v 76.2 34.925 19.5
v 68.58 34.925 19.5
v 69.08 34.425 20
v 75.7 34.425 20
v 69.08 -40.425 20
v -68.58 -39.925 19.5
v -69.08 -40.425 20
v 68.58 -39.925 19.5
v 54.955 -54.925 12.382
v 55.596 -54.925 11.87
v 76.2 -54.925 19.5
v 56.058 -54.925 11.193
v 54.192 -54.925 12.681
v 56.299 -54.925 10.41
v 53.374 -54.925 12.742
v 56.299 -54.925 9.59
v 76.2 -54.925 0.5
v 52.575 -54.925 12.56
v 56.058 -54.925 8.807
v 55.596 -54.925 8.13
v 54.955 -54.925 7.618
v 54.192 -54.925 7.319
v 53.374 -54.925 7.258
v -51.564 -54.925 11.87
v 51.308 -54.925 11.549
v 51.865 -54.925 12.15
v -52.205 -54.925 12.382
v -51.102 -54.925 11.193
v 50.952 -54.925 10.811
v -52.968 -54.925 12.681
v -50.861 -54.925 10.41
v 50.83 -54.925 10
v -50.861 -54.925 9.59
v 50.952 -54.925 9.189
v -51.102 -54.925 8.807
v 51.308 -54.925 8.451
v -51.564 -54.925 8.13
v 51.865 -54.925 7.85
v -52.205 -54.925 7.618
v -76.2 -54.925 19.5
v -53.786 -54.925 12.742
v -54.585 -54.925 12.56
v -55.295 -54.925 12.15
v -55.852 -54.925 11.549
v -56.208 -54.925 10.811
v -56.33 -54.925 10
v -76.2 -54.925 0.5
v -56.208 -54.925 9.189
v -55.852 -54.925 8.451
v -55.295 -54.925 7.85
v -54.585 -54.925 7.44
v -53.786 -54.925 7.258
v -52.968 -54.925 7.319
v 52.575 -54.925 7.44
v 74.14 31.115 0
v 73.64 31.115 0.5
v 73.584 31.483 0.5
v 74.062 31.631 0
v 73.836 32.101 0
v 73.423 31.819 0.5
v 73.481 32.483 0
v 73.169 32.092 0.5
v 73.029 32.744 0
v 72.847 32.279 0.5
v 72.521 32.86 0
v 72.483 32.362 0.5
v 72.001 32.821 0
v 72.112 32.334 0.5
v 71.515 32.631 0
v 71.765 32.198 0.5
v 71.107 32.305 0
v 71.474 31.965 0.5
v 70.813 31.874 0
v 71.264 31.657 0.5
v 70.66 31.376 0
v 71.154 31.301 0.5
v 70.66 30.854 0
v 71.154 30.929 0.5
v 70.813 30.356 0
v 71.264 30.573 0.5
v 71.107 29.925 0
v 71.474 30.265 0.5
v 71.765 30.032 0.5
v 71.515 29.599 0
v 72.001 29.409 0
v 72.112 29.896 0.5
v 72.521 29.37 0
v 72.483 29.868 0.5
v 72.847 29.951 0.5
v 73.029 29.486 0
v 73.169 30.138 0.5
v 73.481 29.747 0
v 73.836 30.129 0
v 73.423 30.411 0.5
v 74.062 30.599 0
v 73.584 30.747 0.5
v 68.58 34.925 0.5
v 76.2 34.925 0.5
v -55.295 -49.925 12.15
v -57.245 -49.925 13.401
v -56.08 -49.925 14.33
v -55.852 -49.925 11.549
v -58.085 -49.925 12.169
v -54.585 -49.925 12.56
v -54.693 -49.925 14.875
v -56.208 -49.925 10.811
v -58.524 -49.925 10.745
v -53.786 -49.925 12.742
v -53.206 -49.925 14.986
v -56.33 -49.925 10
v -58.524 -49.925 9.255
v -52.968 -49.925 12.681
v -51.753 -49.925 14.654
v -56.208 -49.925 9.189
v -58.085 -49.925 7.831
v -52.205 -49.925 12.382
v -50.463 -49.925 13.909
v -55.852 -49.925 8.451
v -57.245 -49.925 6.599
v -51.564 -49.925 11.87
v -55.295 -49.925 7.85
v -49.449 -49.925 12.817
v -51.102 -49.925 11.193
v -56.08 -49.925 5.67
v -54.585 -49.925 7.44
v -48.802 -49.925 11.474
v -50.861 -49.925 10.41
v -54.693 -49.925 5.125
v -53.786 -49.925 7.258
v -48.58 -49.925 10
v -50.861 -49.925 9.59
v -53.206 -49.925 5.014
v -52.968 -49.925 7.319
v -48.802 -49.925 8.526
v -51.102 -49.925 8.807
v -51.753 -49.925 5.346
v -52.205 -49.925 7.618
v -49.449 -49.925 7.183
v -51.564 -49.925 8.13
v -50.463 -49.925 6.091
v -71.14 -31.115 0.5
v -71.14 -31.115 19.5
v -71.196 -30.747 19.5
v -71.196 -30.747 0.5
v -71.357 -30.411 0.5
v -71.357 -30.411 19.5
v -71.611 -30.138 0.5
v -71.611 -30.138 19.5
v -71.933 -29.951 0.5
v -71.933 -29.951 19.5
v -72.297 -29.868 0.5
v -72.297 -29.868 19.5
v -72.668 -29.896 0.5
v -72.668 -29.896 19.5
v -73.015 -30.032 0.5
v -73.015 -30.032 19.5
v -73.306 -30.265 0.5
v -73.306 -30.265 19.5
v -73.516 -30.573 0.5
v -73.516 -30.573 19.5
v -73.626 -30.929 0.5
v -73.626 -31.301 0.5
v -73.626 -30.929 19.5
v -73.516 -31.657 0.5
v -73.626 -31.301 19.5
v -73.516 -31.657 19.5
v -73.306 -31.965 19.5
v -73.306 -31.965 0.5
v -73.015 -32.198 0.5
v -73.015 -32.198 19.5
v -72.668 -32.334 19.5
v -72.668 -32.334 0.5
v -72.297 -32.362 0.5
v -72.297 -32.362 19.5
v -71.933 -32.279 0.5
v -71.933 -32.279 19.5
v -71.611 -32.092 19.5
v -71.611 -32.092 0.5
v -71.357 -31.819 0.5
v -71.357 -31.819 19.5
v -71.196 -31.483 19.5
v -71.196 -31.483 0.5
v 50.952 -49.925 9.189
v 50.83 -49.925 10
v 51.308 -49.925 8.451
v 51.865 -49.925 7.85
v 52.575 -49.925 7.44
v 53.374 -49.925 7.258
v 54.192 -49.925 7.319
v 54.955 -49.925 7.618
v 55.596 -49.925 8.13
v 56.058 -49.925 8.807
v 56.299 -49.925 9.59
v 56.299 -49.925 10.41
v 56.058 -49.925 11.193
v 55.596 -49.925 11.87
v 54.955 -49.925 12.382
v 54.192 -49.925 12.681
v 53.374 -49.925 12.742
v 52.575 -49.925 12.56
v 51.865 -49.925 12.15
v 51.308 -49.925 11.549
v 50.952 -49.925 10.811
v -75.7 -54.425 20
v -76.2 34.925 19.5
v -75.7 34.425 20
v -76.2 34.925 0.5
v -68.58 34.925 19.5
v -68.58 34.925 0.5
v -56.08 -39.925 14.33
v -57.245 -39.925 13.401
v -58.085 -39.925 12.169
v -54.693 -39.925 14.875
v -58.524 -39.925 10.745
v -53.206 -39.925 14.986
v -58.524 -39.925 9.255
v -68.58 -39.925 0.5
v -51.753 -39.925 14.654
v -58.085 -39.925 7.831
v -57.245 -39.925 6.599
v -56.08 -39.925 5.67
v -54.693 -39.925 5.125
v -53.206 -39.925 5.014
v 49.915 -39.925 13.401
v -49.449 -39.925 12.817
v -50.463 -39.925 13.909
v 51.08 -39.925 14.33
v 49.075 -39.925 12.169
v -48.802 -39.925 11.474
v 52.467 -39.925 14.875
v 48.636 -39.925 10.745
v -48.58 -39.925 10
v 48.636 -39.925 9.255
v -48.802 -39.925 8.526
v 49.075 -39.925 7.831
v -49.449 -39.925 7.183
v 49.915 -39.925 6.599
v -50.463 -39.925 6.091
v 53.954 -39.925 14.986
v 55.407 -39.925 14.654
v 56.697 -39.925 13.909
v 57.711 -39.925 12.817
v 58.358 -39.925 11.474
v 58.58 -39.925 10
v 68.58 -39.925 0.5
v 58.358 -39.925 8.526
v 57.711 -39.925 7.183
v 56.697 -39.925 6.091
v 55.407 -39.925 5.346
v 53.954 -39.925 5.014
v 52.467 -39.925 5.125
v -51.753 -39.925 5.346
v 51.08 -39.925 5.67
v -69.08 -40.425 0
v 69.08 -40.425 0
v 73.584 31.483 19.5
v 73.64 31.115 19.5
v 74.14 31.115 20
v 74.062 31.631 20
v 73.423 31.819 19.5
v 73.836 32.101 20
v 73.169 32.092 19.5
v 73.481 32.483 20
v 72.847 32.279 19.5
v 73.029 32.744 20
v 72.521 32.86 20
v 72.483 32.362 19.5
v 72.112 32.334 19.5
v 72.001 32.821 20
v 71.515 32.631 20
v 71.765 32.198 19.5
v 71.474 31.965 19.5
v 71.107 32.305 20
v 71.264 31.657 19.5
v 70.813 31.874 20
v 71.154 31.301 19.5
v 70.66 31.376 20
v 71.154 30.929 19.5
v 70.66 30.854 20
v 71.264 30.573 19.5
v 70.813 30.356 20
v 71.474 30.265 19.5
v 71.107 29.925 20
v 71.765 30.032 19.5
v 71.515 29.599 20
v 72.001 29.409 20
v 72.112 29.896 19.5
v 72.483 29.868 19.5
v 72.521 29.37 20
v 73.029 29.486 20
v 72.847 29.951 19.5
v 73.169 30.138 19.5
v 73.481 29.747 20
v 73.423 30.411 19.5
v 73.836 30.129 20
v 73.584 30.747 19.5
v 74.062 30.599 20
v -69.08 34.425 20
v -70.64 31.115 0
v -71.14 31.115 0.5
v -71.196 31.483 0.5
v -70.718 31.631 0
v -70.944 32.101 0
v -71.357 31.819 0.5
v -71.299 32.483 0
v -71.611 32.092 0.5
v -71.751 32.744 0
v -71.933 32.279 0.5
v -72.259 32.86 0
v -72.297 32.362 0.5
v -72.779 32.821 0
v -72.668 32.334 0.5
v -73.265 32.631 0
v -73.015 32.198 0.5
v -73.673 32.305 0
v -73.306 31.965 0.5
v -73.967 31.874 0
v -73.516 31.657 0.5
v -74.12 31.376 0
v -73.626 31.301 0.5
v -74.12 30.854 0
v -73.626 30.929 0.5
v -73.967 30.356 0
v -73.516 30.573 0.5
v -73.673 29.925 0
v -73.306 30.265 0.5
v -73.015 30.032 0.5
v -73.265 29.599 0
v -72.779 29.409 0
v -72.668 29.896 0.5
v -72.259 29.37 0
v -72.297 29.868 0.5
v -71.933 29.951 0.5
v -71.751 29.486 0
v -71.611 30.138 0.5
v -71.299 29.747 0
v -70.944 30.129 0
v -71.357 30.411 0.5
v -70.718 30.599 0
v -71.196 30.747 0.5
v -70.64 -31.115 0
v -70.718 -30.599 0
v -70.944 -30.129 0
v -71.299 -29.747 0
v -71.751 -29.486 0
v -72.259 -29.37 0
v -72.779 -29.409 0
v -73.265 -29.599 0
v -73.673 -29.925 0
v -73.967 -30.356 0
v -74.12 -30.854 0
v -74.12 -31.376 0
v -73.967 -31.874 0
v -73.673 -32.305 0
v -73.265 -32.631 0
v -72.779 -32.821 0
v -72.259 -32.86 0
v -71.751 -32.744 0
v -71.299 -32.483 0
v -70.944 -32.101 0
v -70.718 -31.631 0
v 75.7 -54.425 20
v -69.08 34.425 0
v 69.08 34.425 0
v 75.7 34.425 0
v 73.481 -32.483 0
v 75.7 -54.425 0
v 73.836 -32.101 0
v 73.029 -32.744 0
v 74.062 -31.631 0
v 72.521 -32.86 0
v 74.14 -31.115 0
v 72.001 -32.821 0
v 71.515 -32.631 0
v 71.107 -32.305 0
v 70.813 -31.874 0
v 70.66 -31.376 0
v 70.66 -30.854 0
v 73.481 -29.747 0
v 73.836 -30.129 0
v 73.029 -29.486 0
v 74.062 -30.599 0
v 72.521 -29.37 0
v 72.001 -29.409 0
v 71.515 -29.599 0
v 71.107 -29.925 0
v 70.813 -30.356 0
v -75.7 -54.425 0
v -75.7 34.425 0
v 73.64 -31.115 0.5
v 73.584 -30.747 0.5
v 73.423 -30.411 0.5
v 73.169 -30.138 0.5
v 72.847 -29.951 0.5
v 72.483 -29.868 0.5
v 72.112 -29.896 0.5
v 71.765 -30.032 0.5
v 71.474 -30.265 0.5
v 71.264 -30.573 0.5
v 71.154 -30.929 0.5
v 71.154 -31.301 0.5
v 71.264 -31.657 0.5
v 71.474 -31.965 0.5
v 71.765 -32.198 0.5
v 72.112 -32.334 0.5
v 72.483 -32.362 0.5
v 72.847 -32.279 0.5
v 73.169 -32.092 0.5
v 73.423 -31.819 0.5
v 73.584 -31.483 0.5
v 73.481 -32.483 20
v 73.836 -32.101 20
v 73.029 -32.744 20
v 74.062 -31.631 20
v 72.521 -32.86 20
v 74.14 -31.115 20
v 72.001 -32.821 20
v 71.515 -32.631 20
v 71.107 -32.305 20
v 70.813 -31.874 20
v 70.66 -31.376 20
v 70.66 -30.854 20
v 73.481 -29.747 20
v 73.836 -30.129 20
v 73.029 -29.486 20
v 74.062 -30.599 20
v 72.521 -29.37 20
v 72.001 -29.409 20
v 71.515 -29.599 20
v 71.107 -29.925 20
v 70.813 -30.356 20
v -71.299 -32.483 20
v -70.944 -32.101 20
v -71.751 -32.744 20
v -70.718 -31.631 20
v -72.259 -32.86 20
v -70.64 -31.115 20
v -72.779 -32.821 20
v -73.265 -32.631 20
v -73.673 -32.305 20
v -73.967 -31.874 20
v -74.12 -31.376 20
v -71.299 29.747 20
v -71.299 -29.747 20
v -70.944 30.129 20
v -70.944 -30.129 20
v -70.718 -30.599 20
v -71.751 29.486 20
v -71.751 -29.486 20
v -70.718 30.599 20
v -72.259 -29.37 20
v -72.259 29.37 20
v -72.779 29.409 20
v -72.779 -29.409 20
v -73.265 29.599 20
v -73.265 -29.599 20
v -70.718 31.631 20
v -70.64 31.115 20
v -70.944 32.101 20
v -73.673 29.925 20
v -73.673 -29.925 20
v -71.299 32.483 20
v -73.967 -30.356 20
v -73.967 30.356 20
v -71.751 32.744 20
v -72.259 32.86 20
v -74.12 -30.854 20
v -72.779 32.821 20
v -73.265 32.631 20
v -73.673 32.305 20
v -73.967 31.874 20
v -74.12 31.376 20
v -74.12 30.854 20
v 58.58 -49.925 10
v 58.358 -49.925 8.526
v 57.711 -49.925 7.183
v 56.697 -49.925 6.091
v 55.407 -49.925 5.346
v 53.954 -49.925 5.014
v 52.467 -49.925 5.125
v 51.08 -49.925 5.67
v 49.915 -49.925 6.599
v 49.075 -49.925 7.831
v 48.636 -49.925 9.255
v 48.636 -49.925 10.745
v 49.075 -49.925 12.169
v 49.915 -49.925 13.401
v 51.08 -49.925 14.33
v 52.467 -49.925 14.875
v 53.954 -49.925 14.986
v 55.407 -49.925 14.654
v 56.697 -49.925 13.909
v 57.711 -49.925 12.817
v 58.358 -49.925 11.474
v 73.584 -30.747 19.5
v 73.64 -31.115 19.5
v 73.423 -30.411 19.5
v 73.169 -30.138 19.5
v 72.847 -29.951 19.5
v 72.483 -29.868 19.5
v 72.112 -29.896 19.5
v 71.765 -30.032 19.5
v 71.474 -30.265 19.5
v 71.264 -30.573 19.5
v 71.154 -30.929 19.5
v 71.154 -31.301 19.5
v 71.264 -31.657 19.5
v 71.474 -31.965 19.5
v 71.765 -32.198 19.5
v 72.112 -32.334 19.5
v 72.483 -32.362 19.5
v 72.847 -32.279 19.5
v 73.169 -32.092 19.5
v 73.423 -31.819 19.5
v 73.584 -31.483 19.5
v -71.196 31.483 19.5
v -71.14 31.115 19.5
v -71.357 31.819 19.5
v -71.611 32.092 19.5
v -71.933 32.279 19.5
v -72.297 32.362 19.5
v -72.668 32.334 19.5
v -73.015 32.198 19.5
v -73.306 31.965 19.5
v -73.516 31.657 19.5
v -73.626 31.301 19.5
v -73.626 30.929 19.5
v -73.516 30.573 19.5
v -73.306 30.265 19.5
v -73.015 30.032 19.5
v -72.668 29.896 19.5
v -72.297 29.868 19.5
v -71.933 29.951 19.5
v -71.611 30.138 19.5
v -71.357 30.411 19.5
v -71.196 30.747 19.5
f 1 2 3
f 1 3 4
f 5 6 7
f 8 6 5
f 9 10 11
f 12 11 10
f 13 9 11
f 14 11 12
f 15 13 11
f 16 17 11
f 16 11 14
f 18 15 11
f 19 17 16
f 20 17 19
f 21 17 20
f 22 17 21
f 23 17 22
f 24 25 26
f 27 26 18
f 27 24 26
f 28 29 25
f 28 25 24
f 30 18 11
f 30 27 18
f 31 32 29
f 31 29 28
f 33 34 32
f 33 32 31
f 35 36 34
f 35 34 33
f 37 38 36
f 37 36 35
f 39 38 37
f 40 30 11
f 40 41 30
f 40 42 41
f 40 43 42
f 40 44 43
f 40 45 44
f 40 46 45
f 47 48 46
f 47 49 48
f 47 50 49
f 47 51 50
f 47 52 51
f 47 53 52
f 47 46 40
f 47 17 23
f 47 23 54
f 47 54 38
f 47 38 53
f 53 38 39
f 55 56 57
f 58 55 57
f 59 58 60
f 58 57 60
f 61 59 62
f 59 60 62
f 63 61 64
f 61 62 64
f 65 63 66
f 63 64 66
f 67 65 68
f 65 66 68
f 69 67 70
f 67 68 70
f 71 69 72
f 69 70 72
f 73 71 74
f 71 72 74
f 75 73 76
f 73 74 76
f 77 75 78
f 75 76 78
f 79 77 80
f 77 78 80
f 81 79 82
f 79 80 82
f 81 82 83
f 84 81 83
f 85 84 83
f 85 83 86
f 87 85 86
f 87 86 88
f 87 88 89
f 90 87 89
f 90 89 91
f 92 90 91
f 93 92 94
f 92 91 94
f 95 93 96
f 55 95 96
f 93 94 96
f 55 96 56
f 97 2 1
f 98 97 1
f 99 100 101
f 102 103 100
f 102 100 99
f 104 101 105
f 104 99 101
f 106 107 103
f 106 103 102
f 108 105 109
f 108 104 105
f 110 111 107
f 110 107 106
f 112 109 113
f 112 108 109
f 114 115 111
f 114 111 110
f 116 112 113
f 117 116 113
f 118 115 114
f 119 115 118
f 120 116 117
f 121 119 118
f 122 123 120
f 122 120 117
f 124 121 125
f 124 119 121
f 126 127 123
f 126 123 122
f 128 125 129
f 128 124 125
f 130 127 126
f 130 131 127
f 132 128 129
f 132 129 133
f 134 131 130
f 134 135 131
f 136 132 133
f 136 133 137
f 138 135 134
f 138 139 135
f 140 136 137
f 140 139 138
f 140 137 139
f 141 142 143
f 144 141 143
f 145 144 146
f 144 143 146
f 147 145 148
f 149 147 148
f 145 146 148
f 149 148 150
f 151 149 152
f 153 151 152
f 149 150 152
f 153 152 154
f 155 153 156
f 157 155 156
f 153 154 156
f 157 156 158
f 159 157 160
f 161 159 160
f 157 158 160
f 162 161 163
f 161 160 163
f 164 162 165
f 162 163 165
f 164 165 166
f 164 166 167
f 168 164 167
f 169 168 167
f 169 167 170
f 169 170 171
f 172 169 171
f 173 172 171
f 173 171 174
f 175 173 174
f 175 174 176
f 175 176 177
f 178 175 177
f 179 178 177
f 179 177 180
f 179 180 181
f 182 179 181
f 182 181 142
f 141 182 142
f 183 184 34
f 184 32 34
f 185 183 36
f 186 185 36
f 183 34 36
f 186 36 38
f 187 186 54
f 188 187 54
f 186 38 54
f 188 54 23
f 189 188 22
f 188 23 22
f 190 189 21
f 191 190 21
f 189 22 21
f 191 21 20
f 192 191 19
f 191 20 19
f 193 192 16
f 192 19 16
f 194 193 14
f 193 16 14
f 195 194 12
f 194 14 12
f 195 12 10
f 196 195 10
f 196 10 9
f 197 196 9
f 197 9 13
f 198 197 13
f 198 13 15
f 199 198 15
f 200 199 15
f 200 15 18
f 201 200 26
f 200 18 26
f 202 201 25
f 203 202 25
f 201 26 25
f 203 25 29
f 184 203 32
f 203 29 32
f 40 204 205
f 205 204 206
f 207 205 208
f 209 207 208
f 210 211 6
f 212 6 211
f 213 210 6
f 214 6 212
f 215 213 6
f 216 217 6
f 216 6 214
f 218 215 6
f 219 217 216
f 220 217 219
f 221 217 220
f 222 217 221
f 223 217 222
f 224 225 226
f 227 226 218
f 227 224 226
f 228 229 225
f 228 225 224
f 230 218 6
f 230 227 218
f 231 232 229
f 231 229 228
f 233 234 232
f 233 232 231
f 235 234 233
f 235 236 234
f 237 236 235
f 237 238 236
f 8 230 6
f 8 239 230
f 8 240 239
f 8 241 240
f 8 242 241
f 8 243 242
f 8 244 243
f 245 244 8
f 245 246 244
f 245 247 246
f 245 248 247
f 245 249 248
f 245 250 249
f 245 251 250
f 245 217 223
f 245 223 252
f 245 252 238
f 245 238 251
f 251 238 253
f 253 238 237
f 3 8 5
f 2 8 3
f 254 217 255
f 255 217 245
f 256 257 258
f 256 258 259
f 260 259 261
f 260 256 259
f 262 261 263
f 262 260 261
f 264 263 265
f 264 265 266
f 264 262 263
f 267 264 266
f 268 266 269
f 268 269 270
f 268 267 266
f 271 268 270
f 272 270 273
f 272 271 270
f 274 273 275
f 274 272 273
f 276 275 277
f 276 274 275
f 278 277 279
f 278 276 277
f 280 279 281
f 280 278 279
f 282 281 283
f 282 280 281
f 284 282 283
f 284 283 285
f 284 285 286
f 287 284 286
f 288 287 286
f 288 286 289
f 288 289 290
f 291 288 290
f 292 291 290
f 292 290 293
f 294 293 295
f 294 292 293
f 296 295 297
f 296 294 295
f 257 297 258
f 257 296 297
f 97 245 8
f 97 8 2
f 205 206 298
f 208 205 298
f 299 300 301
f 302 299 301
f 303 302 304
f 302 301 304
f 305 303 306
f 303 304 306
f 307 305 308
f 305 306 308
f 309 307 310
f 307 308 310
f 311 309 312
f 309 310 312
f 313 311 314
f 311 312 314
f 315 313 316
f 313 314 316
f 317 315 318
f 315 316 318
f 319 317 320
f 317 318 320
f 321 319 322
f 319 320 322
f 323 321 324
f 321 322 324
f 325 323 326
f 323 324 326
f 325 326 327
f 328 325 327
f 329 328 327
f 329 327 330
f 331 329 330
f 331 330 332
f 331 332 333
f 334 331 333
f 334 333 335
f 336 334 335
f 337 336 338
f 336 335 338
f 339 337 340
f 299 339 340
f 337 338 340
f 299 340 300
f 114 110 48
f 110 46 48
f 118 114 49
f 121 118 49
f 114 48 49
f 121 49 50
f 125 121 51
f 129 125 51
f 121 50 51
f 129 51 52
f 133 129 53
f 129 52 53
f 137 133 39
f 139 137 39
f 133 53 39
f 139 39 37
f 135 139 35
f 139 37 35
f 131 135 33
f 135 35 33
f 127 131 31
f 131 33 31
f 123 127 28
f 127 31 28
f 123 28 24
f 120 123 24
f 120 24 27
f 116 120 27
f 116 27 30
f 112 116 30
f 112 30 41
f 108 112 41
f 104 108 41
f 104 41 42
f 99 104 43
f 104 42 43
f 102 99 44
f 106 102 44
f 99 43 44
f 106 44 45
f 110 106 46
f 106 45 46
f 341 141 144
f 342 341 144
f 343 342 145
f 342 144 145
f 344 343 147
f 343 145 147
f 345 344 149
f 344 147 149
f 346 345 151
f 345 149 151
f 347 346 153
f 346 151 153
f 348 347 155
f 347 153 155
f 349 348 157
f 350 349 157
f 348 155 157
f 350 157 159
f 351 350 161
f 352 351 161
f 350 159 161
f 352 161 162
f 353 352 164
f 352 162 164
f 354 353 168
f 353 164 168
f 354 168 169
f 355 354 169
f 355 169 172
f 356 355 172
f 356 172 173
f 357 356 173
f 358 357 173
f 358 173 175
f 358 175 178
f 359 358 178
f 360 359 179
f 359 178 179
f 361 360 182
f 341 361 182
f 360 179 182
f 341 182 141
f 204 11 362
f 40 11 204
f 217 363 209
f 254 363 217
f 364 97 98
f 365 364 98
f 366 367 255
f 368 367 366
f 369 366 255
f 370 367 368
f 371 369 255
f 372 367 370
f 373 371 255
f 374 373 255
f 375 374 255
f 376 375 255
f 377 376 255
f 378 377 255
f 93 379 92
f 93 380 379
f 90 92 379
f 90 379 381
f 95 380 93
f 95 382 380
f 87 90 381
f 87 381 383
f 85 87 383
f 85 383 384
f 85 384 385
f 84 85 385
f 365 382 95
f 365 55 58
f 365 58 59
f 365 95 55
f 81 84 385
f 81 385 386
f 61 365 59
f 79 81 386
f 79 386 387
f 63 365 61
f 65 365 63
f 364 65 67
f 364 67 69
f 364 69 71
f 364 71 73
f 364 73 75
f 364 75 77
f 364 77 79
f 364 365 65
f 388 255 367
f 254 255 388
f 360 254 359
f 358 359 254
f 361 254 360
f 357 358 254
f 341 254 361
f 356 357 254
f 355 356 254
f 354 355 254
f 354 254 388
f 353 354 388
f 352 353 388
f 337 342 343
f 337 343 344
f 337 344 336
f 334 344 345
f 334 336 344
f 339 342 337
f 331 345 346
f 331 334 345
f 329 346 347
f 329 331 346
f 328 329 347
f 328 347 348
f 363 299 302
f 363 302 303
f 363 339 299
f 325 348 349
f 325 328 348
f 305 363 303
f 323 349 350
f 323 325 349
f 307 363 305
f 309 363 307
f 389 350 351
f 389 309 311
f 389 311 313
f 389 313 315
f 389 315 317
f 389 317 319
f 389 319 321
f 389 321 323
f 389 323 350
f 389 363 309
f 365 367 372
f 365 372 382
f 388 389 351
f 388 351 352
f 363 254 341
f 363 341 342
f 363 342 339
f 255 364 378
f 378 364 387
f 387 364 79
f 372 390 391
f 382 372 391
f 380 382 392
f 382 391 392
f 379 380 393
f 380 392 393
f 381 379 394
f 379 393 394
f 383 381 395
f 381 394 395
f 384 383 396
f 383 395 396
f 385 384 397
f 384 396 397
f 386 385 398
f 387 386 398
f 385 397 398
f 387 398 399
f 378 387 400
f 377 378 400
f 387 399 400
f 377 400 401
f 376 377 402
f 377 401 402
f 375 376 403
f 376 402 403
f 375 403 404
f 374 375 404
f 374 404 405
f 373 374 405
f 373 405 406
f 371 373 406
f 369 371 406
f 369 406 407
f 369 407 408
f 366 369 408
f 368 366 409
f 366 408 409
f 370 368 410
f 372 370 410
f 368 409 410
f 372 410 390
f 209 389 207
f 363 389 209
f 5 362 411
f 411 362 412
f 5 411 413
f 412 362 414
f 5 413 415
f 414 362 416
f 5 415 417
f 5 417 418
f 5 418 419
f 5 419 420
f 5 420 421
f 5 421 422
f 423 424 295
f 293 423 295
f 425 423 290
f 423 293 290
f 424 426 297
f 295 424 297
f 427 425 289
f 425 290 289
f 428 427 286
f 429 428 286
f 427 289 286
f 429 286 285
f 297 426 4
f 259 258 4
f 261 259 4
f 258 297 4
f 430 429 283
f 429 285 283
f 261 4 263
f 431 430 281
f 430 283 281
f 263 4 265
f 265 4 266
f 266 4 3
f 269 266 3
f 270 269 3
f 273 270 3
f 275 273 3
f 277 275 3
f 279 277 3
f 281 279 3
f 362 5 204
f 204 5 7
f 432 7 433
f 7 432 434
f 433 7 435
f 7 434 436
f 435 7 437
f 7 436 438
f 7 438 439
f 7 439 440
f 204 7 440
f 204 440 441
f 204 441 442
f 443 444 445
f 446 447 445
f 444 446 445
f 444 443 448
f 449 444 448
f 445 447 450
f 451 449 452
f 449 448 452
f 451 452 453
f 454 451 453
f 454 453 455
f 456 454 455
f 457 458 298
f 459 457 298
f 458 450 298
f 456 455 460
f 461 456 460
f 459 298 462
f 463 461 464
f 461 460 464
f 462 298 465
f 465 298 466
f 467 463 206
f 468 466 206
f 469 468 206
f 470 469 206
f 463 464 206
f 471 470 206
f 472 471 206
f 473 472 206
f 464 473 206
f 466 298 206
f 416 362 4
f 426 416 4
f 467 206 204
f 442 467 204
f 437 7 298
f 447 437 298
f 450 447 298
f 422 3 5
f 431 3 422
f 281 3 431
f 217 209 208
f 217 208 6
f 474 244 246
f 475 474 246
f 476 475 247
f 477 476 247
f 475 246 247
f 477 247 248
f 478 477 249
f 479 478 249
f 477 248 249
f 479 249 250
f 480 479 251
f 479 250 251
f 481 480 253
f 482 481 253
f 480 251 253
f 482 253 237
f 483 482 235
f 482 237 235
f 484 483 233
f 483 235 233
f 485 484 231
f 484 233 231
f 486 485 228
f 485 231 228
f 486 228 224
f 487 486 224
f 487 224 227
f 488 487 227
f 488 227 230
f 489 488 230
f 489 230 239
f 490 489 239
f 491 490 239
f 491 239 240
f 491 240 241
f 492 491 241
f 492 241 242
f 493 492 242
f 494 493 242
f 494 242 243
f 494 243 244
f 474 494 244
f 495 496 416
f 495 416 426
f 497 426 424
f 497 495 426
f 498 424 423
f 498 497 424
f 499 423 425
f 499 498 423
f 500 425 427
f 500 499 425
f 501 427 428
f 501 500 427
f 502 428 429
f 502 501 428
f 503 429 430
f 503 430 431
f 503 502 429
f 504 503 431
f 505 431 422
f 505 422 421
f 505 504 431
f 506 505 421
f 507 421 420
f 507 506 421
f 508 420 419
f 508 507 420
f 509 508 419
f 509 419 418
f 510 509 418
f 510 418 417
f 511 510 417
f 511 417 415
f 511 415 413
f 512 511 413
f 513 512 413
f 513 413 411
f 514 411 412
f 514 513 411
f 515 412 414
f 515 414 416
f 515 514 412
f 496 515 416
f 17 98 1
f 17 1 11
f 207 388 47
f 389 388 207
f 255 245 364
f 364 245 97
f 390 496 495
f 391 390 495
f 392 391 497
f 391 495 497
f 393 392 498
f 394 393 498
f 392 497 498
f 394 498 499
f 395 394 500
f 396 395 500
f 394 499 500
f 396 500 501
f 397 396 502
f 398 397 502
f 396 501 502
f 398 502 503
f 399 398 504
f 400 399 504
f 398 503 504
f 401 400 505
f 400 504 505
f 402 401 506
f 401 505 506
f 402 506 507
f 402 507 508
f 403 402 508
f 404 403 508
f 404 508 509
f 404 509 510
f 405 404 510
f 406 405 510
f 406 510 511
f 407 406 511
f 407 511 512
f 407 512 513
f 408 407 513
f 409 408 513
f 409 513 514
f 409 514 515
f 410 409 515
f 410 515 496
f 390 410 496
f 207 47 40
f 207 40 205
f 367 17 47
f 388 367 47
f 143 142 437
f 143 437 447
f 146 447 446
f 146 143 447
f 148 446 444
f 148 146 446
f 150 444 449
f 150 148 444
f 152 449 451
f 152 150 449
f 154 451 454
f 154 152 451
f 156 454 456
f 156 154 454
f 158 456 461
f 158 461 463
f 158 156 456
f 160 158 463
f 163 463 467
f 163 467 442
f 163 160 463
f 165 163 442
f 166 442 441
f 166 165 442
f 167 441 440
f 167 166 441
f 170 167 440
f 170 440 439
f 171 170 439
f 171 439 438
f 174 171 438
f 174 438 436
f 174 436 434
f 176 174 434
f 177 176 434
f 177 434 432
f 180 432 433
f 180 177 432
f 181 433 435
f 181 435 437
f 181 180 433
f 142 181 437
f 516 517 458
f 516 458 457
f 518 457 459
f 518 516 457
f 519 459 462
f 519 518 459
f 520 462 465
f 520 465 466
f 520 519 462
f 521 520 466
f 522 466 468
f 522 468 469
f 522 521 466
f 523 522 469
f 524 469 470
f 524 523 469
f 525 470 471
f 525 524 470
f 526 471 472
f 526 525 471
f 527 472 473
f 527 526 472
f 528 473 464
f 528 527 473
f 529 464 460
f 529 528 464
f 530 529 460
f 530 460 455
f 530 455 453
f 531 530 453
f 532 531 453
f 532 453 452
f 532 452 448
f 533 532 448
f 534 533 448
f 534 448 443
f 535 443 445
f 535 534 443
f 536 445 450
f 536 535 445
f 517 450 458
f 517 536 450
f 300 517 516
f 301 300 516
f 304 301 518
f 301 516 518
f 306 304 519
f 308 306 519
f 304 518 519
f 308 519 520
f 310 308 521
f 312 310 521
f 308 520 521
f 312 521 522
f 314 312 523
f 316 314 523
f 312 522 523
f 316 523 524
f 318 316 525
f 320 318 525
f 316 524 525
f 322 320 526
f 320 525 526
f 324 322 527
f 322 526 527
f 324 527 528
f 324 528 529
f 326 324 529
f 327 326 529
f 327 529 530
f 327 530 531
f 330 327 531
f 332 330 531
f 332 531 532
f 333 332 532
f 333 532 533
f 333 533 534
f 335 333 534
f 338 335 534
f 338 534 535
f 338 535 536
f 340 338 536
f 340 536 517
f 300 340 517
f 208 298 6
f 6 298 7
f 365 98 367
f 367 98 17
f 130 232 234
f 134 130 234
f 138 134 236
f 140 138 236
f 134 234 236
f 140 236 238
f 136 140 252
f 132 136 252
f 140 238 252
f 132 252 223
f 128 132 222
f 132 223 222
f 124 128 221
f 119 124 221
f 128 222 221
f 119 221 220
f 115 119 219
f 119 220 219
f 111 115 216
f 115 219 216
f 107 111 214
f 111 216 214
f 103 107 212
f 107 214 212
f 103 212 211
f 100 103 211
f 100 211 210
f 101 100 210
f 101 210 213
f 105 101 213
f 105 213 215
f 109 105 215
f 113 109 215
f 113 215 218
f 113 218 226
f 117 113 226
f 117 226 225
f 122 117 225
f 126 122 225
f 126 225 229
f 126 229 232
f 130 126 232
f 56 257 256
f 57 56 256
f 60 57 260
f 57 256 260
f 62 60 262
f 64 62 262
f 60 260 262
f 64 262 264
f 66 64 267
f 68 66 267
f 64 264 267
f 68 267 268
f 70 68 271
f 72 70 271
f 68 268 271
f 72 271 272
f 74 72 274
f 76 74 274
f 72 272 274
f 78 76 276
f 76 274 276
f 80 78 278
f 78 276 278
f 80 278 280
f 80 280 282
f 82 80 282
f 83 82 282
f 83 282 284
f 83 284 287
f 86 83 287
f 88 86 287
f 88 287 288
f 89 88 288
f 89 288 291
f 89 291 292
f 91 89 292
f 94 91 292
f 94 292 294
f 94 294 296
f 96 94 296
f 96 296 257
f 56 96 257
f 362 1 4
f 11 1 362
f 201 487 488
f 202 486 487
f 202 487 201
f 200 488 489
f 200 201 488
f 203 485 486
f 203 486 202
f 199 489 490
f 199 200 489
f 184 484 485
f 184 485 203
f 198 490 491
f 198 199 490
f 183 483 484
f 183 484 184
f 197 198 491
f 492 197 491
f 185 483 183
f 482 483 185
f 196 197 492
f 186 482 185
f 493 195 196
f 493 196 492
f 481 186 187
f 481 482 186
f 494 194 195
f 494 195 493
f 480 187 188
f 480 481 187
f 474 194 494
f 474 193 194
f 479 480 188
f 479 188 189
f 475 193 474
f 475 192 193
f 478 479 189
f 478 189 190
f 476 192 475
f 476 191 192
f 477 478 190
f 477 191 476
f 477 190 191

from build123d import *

# Parameters (mm, degrees)
BOSS_EXTRUDE1_DEPTH            = 20
M3X0_5_TAPPED_HOLE1_D          = 2.5
CHAMFER1_SIZE                  = 0.5
CBORE_FOR_M5_SHCS1_D           = 5.5
CBORE_FOR_M5_SHCS1_CBORE_D     = 10
CBORE_FOR_M5_SHCS1_CBORE_DEPTH = 10


with BuildPart() as part:
    # Sketch2 → Boss-Extrude1 (new body)
    with BuildSketch(Plane.XY):
        Polygon((-76.2, 34.925), (-68.58, 34.925), (-68.58, -39.925), (68.58, -39.925), (68.58, 34.925), (76.2, 34.925), (76.2, -54.925), (-76.2, -54.925), align=None)
    extrude(amount=BOSS_EXTRUDE1_DEPTH)

    # M3x0.5 Tapped Hole1 (through all)
    with Locations(Plane(origin=(0, 0, 0), x_dir=(-1, 0, 0), z_dir=(0, 0, -1))):
        with Locations((-72.39, -31.115), (-72.39, 31.115), (72.39, 31.115), (72.39, -31.115)):
            Hole(M3X0_5_TAPPED_HOLE1_D / 2)

    # Chamfer1
    chamfer1_edges = [part.edges().sort_by_distance(p)[0] for p in [
        (72.39, 34.925, 0),
        (76.2, -10, 0),
        (0, -54.925, 0),
        (-76.2, -10, 0),
        (76.2, -10, 20),
        (72.39, 34.925, 20),
        (68.58, -2.5, 20),
        (0, -39.925, 20),
        (-73.64, -31.115, 0),
        (-73.64, -31.115, 20),
        (-68.58, -2.5, 20),
        (-73.64, 31.115, 0),
        (-73.64, 31.115, 20),
        (-72.39, 34.925, 20),
        (71.14, 31.115, 0),
        (71.14, 31.115, 20),
        (71.14, -31.115, 0),
        (71.14, -31.115, 20),
        (-76.2, -10, 20),
        (-72.39, 34.925, 0),
        (0, -54.925, 20),
        (-68.58, -2.5, 0),
        (0, -39.925, 0),
        (68.58, -2.5, 0),
    ]]
    chamfer(chamfer1_edges, length=CHAMFER1_SIZE)

    # CBORE for M5 SHCS1 (through all)
    with Locations(Plane(origin=(-53.58, -39.925, 10), x_dir=(1, 0, 0), z_dir=(0, 1, 0))):
        with Locations((0, 0), (107.16, 0)):
            CounterBoreHole(CBORE_FOR_M5_SHCS1_D / 2, CBORE_FOR_M5_SHCS1_CBORE_D / 2, CBORE_FOR_M5_SHCS1_CBORE_DEPTH)


solid = part.part
